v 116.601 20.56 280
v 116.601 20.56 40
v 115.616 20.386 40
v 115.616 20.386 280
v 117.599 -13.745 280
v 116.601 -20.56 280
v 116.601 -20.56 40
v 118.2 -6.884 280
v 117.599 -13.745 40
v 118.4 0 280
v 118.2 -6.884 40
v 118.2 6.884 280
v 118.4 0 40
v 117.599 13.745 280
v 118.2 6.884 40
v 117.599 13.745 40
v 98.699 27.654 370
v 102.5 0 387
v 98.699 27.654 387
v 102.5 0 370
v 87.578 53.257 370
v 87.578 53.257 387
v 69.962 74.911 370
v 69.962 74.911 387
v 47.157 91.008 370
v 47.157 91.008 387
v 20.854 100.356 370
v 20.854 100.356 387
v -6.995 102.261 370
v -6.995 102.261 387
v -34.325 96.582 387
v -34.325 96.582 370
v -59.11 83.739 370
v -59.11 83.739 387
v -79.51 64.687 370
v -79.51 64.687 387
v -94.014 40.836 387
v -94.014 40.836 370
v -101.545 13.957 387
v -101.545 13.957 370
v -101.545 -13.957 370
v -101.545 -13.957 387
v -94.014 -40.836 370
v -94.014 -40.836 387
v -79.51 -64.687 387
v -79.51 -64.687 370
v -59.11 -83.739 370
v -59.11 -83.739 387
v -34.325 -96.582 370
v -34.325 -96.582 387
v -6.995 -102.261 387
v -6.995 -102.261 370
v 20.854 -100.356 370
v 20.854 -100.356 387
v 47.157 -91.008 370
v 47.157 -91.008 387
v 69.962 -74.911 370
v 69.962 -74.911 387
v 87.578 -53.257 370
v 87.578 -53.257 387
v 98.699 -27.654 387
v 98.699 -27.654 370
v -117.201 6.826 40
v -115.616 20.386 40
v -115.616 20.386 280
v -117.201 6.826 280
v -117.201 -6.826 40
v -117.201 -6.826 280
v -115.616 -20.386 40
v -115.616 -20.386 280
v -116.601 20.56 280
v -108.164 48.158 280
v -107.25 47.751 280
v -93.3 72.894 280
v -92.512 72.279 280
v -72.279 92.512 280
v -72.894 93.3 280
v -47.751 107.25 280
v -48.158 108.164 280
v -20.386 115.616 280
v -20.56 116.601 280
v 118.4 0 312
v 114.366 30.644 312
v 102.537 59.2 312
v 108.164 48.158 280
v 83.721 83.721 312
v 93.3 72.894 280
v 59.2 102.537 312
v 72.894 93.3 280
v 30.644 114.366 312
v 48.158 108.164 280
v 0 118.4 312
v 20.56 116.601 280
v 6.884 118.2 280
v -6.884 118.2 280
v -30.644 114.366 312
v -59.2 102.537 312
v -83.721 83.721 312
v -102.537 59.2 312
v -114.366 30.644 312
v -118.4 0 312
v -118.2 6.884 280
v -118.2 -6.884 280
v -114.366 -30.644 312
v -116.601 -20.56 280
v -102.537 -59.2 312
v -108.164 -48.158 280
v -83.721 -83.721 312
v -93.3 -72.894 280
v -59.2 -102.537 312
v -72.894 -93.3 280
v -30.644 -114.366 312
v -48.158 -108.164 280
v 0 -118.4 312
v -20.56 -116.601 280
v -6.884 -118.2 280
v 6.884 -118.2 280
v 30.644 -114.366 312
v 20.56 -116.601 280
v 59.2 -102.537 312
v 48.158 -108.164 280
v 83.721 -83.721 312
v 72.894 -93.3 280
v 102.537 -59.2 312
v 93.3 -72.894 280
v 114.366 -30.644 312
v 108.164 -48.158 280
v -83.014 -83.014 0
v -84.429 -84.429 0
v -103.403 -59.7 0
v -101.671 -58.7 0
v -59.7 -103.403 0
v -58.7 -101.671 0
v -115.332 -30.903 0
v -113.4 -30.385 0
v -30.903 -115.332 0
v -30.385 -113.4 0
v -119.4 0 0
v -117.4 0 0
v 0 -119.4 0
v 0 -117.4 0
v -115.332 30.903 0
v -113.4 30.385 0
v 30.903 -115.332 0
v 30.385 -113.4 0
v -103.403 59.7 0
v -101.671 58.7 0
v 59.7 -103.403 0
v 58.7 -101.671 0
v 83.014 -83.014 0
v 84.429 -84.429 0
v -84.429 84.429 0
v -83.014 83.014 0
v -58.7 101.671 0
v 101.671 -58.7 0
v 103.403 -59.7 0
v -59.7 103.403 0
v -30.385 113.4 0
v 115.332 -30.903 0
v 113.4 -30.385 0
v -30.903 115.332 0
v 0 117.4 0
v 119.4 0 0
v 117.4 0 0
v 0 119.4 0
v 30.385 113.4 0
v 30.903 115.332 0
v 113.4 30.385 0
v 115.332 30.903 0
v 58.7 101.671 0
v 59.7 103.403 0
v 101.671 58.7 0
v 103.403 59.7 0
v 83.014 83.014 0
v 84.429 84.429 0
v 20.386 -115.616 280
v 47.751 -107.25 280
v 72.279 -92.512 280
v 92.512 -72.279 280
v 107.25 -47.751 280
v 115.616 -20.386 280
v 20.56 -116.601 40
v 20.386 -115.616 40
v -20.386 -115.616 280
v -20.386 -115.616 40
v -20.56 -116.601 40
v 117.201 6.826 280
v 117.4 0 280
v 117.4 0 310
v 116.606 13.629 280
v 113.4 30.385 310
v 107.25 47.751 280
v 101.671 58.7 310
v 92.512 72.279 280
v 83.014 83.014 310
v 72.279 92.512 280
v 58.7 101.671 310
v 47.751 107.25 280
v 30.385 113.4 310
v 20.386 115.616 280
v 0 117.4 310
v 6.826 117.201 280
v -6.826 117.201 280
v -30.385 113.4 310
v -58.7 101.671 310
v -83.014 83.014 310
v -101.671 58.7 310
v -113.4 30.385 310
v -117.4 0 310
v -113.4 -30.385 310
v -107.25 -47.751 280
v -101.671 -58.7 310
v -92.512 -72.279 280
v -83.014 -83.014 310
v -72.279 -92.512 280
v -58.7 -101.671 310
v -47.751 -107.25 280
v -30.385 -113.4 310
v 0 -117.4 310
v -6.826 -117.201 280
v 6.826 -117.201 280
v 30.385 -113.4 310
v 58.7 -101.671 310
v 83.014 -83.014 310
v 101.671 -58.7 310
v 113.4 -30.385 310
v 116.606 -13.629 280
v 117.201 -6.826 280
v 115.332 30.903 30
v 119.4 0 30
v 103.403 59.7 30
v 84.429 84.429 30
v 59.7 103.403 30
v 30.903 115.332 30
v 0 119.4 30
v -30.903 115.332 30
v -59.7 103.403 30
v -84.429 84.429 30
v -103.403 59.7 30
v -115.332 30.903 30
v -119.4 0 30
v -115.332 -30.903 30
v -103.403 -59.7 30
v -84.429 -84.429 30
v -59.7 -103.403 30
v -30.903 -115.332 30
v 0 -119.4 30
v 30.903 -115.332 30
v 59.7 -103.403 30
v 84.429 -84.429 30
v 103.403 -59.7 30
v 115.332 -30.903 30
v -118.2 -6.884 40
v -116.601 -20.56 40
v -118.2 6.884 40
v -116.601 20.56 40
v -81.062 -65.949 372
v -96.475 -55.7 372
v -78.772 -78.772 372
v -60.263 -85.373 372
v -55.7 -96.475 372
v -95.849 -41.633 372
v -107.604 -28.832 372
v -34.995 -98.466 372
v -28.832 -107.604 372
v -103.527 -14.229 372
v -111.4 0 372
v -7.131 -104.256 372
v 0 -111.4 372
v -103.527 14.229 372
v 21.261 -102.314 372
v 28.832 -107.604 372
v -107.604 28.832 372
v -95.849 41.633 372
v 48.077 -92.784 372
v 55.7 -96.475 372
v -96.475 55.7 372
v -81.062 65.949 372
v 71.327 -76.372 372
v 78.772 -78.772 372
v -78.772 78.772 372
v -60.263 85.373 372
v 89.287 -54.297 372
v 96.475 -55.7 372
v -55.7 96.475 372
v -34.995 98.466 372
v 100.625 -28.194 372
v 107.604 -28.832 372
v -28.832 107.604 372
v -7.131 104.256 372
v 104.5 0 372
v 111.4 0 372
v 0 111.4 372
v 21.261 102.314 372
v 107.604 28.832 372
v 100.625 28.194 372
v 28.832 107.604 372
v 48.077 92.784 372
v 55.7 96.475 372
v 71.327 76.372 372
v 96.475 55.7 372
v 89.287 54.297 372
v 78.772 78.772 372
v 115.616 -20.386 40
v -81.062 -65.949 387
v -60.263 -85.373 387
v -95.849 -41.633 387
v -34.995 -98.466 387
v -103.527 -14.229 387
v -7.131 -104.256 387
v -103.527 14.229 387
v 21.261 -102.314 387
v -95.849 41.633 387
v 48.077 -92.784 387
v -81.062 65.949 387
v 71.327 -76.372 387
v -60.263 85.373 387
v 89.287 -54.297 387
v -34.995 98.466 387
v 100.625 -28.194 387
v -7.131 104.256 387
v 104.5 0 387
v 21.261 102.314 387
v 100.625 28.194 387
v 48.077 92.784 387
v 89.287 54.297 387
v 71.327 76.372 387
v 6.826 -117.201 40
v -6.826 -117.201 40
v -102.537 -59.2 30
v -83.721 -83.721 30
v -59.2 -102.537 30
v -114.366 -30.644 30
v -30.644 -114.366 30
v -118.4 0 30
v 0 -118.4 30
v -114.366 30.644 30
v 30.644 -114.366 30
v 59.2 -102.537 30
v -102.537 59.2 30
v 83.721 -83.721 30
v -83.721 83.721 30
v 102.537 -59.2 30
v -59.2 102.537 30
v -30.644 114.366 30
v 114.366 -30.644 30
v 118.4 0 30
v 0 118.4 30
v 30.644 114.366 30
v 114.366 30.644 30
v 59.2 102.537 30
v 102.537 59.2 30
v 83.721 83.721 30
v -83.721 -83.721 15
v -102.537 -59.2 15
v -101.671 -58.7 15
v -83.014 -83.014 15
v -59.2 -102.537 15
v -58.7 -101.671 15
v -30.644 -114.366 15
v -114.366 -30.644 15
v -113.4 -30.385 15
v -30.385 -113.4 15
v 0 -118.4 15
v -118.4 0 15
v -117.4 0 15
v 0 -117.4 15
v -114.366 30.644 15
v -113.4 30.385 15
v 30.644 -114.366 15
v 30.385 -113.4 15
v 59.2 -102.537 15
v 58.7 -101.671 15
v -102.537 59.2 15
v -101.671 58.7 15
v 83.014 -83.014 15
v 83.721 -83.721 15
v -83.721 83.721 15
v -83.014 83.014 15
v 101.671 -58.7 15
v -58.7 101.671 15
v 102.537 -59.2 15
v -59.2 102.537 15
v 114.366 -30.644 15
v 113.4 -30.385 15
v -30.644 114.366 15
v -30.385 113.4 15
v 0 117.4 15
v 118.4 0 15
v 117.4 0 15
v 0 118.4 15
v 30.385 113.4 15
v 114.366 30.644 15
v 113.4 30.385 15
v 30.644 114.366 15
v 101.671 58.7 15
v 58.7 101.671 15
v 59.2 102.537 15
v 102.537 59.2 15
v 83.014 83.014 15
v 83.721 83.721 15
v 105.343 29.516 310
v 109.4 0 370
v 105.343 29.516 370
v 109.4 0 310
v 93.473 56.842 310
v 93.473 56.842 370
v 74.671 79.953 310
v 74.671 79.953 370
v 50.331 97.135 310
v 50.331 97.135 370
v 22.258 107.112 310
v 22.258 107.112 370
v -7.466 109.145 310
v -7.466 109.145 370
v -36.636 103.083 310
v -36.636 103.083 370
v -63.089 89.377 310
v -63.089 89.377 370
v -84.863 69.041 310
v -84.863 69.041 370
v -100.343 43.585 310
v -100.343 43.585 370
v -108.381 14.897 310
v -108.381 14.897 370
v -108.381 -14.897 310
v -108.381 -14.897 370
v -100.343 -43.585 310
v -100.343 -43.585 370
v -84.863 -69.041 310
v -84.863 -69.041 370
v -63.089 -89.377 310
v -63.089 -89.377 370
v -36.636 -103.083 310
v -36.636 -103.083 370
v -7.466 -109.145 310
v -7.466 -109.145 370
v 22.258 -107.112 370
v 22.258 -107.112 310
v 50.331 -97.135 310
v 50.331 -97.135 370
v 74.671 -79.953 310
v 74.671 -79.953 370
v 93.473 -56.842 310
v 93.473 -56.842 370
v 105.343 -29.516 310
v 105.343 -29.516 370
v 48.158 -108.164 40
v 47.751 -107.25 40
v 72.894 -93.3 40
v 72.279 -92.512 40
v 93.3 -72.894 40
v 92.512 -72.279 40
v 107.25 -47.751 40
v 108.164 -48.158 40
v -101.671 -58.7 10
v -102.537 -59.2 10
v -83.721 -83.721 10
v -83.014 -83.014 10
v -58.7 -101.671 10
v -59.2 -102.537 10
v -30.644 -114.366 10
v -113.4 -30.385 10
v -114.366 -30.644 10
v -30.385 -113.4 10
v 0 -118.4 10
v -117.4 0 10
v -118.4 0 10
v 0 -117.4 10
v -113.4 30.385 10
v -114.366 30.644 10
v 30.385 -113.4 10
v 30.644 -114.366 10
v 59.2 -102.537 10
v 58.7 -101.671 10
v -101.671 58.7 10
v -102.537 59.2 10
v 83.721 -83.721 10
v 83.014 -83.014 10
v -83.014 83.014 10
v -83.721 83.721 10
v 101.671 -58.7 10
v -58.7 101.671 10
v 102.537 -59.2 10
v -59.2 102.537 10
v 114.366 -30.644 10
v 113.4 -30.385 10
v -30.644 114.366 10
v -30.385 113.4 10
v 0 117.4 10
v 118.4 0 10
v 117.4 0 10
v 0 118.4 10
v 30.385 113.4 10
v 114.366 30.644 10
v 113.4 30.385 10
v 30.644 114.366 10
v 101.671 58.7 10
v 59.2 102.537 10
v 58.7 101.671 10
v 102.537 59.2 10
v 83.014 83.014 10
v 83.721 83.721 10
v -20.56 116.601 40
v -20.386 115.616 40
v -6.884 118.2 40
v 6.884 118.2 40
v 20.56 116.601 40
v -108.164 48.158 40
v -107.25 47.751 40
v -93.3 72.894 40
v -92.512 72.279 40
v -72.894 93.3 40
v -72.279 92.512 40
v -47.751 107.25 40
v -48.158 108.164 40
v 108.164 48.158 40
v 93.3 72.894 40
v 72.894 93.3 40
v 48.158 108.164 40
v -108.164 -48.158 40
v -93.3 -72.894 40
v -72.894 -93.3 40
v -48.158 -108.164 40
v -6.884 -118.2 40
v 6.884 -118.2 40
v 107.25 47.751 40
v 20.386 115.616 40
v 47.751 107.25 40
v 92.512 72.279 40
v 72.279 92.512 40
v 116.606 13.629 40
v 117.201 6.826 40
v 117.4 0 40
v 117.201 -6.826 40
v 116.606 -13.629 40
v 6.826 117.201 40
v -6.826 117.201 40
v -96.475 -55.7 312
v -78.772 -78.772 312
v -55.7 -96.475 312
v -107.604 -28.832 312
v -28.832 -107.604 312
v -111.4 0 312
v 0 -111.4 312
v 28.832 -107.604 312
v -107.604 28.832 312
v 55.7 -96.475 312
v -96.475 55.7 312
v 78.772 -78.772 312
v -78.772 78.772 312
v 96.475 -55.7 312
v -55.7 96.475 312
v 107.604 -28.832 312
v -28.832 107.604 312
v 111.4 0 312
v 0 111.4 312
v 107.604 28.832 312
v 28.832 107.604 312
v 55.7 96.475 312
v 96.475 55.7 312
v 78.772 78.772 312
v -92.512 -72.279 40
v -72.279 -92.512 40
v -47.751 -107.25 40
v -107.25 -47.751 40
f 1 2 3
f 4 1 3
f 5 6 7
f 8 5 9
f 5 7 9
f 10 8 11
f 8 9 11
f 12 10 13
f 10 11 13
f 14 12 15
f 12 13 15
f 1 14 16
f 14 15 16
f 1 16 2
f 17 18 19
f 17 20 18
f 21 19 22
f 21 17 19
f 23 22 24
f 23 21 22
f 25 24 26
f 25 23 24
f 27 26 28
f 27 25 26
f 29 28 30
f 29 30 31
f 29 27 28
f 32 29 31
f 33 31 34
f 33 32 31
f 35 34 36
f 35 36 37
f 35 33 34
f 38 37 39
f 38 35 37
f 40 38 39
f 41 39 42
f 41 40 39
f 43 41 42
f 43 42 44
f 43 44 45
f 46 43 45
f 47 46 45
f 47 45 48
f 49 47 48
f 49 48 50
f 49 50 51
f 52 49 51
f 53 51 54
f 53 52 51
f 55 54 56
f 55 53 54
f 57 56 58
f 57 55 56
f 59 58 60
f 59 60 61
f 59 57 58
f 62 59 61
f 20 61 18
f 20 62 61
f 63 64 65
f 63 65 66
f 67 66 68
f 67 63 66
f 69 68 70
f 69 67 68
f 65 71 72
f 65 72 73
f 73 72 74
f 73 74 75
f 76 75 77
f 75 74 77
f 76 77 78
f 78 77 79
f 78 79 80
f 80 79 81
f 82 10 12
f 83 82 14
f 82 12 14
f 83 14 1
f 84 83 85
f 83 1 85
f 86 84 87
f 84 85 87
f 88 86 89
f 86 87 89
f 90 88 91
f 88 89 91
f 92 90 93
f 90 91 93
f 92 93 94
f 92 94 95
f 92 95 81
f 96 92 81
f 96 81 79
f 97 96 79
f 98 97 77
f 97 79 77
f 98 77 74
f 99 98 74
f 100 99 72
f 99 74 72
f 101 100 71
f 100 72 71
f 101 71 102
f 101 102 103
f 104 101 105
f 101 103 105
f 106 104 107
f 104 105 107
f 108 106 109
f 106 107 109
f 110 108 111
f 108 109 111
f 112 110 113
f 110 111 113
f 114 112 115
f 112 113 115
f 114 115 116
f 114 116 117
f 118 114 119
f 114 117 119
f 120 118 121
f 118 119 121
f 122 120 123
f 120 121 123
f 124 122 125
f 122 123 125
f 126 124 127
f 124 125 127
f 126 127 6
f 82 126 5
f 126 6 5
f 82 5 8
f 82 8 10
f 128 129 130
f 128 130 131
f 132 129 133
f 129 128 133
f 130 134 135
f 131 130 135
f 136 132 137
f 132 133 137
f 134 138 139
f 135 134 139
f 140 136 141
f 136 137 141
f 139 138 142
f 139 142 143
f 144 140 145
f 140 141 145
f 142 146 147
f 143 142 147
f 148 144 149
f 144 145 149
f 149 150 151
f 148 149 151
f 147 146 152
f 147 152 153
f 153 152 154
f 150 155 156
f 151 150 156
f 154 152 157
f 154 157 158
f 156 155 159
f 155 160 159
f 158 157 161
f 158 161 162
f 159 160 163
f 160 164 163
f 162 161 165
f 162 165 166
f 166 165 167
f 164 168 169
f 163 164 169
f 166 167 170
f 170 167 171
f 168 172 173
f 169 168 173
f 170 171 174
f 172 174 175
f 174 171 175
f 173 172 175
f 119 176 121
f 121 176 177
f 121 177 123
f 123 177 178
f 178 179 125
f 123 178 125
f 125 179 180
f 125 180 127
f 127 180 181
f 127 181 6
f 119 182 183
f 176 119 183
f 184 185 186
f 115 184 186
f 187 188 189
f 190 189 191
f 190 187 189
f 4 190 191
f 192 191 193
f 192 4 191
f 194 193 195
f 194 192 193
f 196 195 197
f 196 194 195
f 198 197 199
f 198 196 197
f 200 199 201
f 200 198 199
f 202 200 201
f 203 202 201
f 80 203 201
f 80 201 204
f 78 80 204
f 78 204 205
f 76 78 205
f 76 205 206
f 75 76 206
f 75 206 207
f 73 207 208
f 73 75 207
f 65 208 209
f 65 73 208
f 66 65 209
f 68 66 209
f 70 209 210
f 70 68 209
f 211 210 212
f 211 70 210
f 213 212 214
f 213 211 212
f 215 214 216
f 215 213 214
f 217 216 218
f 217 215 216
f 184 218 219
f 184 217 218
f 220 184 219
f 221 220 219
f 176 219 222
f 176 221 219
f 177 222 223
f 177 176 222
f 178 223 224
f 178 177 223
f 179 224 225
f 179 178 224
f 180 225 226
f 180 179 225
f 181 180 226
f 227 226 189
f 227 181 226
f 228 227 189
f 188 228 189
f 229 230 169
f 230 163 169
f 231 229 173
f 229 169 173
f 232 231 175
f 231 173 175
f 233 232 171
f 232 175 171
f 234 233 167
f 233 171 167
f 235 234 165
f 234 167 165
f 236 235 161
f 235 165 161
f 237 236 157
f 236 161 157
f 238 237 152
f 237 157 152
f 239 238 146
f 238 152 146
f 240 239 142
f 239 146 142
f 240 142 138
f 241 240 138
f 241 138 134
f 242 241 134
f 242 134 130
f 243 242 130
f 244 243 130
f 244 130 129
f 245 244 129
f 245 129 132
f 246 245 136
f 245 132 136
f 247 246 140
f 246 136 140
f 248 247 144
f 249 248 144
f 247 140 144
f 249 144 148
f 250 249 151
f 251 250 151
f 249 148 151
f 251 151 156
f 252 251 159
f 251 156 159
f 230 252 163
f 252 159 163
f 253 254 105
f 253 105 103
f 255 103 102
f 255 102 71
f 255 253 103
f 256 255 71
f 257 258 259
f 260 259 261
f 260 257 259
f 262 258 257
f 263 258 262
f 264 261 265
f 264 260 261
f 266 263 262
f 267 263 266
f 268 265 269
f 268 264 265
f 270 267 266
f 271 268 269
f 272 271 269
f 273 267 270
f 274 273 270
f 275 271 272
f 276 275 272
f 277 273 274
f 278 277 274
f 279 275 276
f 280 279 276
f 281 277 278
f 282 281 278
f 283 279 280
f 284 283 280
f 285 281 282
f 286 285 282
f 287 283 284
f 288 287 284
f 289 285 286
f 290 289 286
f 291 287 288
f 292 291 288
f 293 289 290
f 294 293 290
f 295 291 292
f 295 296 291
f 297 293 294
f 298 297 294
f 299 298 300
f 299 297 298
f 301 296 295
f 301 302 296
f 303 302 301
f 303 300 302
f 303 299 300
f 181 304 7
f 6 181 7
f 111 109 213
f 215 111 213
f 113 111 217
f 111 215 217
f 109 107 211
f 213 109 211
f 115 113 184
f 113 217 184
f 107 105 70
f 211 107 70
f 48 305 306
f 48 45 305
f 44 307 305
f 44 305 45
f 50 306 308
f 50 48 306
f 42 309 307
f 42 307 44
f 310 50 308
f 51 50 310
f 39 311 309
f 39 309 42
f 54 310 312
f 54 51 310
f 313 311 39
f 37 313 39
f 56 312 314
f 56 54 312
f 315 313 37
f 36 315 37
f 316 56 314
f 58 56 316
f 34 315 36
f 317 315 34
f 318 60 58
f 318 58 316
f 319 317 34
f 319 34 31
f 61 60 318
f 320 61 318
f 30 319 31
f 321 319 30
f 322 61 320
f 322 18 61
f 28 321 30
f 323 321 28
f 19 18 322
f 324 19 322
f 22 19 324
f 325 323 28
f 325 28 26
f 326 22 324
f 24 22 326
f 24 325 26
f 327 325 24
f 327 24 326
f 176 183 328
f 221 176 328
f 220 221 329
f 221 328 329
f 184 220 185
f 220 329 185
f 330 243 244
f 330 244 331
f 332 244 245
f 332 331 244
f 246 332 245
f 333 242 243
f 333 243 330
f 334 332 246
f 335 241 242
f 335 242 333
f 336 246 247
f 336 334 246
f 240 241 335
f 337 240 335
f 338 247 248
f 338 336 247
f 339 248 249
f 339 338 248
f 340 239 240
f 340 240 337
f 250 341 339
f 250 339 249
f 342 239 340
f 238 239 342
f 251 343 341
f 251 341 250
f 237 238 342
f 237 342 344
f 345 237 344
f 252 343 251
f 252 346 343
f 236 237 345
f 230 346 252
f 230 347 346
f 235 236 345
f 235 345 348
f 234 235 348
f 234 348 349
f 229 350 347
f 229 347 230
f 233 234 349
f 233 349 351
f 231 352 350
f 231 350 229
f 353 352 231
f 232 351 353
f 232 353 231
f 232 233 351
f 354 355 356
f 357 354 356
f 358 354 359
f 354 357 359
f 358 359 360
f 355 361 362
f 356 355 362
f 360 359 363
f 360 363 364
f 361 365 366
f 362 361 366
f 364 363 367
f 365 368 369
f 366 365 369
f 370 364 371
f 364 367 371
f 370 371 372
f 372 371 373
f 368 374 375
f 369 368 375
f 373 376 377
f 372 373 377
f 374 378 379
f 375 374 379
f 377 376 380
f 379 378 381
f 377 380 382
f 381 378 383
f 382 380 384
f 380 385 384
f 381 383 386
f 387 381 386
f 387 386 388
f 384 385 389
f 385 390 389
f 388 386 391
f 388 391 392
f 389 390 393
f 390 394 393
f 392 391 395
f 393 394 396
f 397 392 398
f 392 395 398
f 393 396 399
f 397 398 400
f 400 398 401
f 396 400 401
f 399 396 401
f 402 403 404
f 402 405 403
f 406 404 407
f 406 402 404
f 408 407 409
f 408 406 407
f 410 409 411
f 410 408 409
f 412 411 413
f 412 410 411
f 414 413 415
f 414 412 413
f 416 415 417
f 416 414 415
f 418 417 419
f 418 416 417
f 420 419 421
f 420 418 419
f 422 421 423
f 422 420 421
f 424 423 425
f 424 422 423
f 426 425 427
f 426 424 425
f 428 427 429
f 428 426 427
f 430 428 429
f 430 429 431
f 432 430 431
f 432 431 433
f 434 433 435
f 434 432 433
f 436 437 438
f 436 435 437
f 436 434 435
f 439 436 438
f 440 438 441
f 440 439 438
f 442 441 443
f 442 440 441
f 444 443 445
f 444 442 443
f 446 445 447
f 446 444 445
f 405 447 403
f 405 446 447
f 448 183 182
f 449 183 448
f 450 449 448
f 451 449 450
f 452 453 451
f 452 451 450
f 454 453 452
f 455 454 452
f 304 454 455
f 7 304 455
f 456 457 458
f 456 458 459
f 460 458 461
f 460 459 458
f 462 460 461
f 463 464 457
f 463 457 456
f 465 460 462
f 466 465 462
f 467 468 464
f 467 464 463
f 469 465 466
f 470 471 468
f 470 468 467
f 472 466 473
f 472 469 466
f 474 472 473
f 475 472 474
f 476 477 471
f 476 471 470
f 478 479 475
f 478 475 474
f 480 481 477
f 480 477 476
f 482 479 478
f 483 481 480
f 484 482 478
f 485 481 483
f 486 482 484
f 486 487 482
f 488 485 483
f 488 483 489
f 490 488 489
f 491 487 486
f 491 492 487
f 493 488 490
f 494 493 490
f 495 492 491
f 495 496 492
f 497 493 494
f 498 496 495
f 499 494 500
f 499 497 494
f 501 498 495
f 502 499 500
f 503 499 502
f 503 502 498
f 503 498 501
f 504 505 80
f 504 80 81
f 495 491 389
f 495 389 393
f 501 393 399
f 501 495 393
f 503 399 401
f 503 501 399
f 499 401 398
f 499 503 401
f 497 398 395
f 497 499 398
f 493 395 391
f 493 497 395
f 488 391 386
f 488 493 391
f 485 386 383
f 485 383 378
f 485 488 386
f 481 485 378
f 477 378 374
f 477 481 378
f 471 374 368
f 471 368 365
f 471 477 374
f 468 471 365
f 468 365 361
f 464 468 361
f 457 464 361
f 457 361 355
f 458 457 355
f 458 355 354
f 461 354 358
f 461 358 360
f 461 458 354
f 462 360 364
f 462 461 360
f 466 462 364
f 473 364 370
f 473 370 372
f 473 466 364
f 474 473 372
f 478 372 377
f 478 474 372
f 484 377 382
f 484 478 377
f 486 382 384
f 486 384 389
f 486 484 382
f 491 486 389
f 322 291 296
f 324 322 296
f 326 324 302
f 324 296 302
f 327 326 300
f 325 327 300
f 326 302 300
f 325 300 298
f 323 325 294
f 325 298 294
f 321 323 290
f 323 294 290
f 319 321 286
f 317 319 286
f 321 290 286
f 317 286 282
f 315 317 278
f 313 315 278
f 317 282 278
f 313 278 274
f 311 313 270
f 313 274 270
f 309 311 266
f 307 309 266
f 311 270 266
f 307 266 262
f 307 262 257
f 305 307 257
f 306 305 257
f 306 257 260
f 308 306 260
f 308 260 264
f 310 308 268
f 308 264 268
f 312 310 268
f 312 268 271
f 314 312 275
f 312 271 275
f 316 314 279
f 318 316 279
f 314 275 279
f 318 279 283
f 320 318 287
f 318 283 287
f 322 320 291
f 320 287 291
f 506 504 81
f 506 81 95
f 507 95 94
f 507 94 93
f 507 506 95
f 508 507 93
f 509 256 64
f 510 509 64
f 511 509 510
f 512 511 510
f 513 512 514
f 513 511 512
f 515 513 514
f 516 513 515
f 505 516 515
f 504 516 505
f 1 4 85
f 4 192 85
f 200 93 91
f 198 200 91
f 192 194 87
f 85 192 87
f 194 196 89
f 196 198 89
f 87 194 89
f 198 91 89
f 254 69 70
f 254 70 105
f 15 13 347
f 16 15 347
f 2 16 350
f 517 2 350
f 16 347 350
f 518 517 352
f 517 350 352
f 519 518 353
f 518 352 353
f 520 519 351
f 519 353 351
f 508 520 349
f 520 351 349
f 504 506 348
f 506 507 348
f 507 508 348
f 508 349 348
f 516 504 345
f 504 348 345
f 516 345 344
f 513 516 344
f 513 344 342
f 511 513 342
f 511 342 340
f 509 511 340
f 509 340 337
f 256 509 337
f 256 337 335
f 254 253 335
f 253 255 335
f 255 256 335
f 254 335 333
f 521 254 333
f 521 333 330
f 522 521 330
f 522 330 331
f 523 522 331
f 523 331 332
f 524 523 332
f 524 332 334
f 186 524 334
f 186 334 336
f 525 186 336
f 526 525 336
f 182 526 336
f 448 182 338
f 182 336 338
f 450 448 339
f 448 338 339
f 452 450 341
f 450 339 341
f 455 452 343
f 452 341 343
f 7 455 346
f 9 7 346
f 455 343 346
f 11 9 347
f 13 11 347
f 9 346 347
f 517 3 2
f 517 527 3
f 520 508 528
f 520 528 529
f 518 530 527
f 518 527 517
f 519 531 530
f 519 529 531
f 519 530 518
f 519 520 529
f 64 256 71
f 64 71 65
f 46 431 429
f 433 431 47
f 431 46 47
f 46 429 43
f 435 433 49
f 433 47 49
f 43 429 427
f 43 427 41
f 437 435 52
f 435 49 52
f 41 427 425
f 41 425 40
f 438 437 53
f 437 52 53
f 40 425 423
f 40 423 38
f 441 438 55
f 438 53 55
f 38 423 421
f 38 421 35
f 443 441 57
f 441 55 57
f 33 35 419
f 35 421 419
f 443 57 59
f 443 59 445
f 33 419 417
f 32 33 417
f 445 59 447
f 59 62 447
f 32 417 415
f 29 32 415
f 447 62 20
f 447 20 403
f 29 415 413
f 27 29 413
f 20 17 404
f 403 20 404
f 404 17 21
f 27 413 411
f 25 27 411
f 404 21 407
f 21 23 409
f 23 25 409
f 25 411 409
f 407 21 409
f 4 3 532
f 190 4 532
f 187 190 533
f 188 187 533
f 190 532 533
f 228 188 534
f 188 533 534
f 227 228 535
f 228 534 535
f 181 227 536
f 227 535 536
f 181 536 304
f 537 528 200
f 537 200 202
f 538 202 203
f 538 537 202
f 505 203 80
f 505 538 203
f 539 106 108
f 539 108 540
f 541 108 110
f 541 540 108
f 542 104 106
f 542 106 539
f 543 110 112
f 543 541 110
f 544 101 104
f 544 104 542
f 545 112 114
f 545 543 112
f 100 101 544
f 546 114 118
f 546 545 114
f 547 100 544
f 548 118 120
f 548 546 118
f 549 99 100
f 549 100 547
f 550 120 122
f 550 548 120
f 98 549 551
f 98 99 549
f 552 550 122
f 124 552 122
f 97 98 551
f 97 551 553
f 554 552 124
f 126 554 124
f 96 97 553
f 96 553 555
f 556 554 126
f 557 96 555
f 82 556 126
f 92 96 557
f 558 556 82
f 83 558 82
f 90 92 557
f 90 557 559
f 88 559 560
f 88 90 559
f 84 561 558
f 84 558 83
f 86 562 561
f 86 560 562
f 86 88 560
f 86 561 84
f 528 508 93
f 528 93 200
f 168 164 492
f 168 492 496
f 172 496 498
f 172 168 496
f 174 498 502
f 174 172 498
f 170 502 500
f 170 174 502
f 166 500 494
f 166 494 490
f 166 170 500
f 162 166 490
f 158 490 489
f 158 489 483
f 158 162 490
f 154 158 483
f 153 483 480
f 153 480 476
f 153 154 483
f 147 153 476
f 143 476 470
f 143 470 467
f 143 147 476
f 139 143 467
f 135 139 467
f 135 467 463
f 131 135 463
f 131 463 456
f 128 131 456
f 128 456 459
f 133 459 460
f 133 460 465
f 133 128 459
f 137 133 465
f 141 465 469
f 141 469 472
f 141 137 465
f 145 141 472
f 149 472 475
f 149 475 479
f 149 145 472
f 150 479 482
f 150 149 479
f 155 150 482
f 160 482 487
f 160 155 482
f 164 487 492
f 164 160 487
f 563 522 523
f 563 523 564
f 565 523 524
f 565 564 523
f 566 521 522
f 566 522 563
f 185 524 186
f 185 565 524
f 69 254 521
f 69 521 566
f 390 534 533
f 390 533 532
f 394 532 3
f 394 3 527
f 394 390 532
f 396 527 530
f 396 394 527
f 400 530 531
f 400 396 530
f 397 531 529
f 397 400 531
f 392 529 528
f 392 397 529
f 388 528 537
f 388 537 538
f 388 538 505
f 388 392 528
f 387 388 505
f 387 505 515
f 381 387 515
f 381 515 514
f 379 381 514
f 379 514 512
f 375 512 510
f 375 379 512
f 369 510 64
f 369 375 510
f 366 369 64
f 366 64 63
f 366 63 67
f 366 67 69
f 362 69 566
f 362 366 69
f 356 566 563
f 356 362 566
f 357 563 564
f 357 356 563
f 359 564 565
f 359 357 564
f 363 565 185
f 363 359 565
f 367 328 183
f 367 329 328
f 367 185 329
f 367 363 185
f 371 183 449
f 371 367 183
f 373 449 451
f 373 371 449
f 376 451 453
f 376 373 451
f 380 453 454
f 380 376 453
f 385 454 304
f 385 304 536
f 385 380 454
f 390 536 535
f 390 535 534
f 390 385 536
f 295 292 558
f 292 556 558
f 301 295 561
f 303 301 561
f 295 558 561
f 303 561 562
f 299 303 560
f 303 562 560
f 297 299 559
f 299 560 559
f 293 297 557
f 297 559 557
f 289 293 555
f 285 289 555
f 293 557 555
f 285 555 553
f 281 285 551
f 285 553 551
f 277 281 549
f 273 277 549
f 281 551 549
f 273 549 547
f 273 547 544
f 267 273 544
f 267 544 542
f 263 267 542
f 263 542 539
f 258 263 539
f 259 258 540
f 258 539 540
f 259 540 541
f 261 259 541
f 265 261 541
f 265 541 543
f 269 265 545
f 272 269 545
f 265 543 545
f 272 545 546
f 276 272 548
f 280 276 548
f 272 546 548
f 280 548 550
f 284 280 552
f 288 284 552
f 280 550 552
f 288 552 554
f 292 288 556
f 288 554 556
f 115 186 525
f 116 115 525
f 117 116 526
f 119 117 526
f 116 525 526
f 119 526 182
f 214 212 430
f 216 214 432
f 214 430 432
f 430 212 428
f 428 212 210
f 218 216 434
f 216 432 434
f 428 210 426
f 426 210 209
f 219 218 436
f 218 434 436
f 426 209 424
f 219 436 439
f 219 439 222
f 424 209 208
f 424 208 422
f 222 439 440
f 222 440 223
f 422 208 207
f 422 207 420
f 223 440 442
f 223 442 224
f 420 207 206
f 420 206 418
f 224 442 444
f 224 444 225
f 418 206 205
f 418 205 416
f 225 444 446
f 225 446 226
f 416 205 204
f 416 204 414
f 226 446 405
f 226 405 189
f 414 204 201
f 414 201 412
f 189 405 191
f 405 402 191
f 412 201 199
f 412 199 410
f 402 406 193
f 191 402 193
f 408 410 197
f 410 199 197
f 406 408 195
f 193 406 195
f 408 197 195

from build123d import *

# Parameters (mm, degrees)
SKETCH1_R       = 119.4
SKETCH1_R_2     = 117.4
EXTRUDE1_DEPTH  = 10
SKETCH2_R       = 119.4
SKETCH2_R_2     = 118.4
EXTRUDE2_DEPTH  = 5
SKETCH3_R       = 119.4
SKETCH3_R_2     = 117.4
EXTRUDE3_DEPTH  = 15
SKETCH4_R       = 118.4
SKETCH4_R_2     = 117.4
EXTRUDE4_DEPTH  = 10
EXTRUDE5_DEPTH  = 240
SKETCH6_R       = 118.4
SKETCH6_R_2     = 117.4
EXTRUDE6_DEPTH  = 30
SKETCH7_R       = 118.4
SKETCH7_R_2     = 109.4
EXTRUDE7_DEPTH  = 2
SKETCH8_R       = 111.4
SKETCH8_R_2     = 109.4
EXTRUDE8_DEPTH  = 60
SKETCH9_R       = 111.4
SKETCH9_R_2     = 102.5
EXTRUDE9_DEPTH  = 2
SKETCH10_R      = 104.5
SKETCH10_R_2    = 102.5
EXTRUDE10_DEPTH = 15


with BuildPart() as part:
    # Sketch1 → Extrude1 (new body)
    with BuildSketch(Plane.XY):
        Circle(SKETCH1_R)
        Circle(SKETCH1_R_2, mode=Mode.SUBTRACT)
    extrude(amount=EXTRUDE1_DEPTH)

    # Sketch2 → Extrude2 (add)
    with BuildSketch(Plane.XY.offset(10)):
        Circle(SKETCH2_R)
        Circle(SKETCH2_R_2, mode=Mode.SUBTRACT)
    extrude(amount=EXTRUDE2_DEPTH)

    # Sketch3 → Extrude3 (add)
    with BuildSketch(Plane.XY.offset(15)):
        Circle(SKETCH3_R)
        Circle(SKETCH3_R_2, mode=Mode.SUBTRACT)
    extrude(amount=EXTRUDE3_DEPTH)

    # Sketch4 → Extrude4 (add)
    with BuildSketch(Plane.XY.offset(30)):
        Circle(SKETCH4_R)
        Circle(SKETCH4_R_2, mode=Mode.SUBTRACT)
    extrude(amount=EXTRUDE4_DEPTH)

    # Sketch5 → Extrude5 (add)
    with BuildSketch(Plane.XY.offset(40)):
        with BuildLine():
            Line((20.559944, 116.601238), (20.386296, 115.61643))
            ThreePointArc((20.386296, 115.61643), (0, 117.4), (-20.386296, 115.61643))
            Line((-20.386296, 115.61643), (-20.559944, 116.601238))
            ThreePointArc((-20.559944, 116.601238), (0, 118.4), (20.559944, 116.601238))
        make_face()
        with BuildLine():
            Line((116.601238, 20.559944), (115.61643, 20.386296))
            ThreePointArc((115.61643, 20.386296), (117.4, 0), (115.61643, -20.386296))
            Line((115.61643, -20.386296), (116.601238, -20.559944))
            ThreePointArc((116.601238, -20.559944), (118.4, 0), (116.601238, 20.559944))
        make_face()
        with BuildLine():
            Line((20.559944, -116.601238), (20.386296, -115.61643))
            ThreePointArc((20.386296, -115.61643), (0, -117.4), (-20.386296, -115.61643))
            Line((-20.386296, -115.61643), (-20.559944, -116.601238))
            ThreePointArc((-20.559944, -116.601238), (0, -118.4), (20.559944, -116.601238))
        make_face()
        with BuildLine():
            Line((-115.61643, -20.386296), (-116.601238, -20.559944))
            ThreePointArc((-116.601238, -20.559944), (-118.4, 0), (-116.601238, 20.559944))
            Line((-116.601238, 20.559944), (-115.61643, 20.386296))
            ThreePointArc((-115.61643, 20.386296), (-117.4, 0), (-115.61643, -20.386296))
        make_face()
    extrude(amount=EXTRUDE5_DEPTH)

    # Sketch6 → Extrude6 (add)
    with BuildSketch(Plane.XY.offset(280)):
        Circle(SKETCH6_R)
        Circle(SKETCH6_R_2, mode=Mode.SUBTRACT)
    extrude(amount=EXTRUDE6_DEPTH)

    # Sketch7 → Extrude7 (add)
    with BuildSketch(Plane.XY.offset(310)):
        Circle(SKETCH7_R)
        Circle(SKETCH7_R_2, mode=Mode.SUBTRACT)
    extrude(amount=EXTRUDE7_DEPTH)

    # Sketch8 → Extrude8 (add)
    with BuildSketch(Plane.XY.offset(312)):
        Circle(SKETCH8_R)
        Circle(SKETCH8_R_2, mode=Mode.SUBTRACT)
    extrude(amount=EXTRUDE8_DEPTH)

    # Sketch9 → Extrude9 (add)
    with BuildSketch(Plane.XY.offset(372)):
        Circle(SKETCH9_R)
        Circle(SKETCH9_R_2, mode=Mode.SUBTRACT)
    extrude(amount=-EXTRUDE9_DEPTH)

    # Sketch10 → Extrude10 (add)
    with BuildSketch(Plane.XY.offset(372)):
        Circle(SKETCH10_R)
        Circle(SKETCH10_R_2, mode=Mode.SUBTRACT)
    extrude(amount=EXTRUDE10_DEPTH)


solid = part.part
